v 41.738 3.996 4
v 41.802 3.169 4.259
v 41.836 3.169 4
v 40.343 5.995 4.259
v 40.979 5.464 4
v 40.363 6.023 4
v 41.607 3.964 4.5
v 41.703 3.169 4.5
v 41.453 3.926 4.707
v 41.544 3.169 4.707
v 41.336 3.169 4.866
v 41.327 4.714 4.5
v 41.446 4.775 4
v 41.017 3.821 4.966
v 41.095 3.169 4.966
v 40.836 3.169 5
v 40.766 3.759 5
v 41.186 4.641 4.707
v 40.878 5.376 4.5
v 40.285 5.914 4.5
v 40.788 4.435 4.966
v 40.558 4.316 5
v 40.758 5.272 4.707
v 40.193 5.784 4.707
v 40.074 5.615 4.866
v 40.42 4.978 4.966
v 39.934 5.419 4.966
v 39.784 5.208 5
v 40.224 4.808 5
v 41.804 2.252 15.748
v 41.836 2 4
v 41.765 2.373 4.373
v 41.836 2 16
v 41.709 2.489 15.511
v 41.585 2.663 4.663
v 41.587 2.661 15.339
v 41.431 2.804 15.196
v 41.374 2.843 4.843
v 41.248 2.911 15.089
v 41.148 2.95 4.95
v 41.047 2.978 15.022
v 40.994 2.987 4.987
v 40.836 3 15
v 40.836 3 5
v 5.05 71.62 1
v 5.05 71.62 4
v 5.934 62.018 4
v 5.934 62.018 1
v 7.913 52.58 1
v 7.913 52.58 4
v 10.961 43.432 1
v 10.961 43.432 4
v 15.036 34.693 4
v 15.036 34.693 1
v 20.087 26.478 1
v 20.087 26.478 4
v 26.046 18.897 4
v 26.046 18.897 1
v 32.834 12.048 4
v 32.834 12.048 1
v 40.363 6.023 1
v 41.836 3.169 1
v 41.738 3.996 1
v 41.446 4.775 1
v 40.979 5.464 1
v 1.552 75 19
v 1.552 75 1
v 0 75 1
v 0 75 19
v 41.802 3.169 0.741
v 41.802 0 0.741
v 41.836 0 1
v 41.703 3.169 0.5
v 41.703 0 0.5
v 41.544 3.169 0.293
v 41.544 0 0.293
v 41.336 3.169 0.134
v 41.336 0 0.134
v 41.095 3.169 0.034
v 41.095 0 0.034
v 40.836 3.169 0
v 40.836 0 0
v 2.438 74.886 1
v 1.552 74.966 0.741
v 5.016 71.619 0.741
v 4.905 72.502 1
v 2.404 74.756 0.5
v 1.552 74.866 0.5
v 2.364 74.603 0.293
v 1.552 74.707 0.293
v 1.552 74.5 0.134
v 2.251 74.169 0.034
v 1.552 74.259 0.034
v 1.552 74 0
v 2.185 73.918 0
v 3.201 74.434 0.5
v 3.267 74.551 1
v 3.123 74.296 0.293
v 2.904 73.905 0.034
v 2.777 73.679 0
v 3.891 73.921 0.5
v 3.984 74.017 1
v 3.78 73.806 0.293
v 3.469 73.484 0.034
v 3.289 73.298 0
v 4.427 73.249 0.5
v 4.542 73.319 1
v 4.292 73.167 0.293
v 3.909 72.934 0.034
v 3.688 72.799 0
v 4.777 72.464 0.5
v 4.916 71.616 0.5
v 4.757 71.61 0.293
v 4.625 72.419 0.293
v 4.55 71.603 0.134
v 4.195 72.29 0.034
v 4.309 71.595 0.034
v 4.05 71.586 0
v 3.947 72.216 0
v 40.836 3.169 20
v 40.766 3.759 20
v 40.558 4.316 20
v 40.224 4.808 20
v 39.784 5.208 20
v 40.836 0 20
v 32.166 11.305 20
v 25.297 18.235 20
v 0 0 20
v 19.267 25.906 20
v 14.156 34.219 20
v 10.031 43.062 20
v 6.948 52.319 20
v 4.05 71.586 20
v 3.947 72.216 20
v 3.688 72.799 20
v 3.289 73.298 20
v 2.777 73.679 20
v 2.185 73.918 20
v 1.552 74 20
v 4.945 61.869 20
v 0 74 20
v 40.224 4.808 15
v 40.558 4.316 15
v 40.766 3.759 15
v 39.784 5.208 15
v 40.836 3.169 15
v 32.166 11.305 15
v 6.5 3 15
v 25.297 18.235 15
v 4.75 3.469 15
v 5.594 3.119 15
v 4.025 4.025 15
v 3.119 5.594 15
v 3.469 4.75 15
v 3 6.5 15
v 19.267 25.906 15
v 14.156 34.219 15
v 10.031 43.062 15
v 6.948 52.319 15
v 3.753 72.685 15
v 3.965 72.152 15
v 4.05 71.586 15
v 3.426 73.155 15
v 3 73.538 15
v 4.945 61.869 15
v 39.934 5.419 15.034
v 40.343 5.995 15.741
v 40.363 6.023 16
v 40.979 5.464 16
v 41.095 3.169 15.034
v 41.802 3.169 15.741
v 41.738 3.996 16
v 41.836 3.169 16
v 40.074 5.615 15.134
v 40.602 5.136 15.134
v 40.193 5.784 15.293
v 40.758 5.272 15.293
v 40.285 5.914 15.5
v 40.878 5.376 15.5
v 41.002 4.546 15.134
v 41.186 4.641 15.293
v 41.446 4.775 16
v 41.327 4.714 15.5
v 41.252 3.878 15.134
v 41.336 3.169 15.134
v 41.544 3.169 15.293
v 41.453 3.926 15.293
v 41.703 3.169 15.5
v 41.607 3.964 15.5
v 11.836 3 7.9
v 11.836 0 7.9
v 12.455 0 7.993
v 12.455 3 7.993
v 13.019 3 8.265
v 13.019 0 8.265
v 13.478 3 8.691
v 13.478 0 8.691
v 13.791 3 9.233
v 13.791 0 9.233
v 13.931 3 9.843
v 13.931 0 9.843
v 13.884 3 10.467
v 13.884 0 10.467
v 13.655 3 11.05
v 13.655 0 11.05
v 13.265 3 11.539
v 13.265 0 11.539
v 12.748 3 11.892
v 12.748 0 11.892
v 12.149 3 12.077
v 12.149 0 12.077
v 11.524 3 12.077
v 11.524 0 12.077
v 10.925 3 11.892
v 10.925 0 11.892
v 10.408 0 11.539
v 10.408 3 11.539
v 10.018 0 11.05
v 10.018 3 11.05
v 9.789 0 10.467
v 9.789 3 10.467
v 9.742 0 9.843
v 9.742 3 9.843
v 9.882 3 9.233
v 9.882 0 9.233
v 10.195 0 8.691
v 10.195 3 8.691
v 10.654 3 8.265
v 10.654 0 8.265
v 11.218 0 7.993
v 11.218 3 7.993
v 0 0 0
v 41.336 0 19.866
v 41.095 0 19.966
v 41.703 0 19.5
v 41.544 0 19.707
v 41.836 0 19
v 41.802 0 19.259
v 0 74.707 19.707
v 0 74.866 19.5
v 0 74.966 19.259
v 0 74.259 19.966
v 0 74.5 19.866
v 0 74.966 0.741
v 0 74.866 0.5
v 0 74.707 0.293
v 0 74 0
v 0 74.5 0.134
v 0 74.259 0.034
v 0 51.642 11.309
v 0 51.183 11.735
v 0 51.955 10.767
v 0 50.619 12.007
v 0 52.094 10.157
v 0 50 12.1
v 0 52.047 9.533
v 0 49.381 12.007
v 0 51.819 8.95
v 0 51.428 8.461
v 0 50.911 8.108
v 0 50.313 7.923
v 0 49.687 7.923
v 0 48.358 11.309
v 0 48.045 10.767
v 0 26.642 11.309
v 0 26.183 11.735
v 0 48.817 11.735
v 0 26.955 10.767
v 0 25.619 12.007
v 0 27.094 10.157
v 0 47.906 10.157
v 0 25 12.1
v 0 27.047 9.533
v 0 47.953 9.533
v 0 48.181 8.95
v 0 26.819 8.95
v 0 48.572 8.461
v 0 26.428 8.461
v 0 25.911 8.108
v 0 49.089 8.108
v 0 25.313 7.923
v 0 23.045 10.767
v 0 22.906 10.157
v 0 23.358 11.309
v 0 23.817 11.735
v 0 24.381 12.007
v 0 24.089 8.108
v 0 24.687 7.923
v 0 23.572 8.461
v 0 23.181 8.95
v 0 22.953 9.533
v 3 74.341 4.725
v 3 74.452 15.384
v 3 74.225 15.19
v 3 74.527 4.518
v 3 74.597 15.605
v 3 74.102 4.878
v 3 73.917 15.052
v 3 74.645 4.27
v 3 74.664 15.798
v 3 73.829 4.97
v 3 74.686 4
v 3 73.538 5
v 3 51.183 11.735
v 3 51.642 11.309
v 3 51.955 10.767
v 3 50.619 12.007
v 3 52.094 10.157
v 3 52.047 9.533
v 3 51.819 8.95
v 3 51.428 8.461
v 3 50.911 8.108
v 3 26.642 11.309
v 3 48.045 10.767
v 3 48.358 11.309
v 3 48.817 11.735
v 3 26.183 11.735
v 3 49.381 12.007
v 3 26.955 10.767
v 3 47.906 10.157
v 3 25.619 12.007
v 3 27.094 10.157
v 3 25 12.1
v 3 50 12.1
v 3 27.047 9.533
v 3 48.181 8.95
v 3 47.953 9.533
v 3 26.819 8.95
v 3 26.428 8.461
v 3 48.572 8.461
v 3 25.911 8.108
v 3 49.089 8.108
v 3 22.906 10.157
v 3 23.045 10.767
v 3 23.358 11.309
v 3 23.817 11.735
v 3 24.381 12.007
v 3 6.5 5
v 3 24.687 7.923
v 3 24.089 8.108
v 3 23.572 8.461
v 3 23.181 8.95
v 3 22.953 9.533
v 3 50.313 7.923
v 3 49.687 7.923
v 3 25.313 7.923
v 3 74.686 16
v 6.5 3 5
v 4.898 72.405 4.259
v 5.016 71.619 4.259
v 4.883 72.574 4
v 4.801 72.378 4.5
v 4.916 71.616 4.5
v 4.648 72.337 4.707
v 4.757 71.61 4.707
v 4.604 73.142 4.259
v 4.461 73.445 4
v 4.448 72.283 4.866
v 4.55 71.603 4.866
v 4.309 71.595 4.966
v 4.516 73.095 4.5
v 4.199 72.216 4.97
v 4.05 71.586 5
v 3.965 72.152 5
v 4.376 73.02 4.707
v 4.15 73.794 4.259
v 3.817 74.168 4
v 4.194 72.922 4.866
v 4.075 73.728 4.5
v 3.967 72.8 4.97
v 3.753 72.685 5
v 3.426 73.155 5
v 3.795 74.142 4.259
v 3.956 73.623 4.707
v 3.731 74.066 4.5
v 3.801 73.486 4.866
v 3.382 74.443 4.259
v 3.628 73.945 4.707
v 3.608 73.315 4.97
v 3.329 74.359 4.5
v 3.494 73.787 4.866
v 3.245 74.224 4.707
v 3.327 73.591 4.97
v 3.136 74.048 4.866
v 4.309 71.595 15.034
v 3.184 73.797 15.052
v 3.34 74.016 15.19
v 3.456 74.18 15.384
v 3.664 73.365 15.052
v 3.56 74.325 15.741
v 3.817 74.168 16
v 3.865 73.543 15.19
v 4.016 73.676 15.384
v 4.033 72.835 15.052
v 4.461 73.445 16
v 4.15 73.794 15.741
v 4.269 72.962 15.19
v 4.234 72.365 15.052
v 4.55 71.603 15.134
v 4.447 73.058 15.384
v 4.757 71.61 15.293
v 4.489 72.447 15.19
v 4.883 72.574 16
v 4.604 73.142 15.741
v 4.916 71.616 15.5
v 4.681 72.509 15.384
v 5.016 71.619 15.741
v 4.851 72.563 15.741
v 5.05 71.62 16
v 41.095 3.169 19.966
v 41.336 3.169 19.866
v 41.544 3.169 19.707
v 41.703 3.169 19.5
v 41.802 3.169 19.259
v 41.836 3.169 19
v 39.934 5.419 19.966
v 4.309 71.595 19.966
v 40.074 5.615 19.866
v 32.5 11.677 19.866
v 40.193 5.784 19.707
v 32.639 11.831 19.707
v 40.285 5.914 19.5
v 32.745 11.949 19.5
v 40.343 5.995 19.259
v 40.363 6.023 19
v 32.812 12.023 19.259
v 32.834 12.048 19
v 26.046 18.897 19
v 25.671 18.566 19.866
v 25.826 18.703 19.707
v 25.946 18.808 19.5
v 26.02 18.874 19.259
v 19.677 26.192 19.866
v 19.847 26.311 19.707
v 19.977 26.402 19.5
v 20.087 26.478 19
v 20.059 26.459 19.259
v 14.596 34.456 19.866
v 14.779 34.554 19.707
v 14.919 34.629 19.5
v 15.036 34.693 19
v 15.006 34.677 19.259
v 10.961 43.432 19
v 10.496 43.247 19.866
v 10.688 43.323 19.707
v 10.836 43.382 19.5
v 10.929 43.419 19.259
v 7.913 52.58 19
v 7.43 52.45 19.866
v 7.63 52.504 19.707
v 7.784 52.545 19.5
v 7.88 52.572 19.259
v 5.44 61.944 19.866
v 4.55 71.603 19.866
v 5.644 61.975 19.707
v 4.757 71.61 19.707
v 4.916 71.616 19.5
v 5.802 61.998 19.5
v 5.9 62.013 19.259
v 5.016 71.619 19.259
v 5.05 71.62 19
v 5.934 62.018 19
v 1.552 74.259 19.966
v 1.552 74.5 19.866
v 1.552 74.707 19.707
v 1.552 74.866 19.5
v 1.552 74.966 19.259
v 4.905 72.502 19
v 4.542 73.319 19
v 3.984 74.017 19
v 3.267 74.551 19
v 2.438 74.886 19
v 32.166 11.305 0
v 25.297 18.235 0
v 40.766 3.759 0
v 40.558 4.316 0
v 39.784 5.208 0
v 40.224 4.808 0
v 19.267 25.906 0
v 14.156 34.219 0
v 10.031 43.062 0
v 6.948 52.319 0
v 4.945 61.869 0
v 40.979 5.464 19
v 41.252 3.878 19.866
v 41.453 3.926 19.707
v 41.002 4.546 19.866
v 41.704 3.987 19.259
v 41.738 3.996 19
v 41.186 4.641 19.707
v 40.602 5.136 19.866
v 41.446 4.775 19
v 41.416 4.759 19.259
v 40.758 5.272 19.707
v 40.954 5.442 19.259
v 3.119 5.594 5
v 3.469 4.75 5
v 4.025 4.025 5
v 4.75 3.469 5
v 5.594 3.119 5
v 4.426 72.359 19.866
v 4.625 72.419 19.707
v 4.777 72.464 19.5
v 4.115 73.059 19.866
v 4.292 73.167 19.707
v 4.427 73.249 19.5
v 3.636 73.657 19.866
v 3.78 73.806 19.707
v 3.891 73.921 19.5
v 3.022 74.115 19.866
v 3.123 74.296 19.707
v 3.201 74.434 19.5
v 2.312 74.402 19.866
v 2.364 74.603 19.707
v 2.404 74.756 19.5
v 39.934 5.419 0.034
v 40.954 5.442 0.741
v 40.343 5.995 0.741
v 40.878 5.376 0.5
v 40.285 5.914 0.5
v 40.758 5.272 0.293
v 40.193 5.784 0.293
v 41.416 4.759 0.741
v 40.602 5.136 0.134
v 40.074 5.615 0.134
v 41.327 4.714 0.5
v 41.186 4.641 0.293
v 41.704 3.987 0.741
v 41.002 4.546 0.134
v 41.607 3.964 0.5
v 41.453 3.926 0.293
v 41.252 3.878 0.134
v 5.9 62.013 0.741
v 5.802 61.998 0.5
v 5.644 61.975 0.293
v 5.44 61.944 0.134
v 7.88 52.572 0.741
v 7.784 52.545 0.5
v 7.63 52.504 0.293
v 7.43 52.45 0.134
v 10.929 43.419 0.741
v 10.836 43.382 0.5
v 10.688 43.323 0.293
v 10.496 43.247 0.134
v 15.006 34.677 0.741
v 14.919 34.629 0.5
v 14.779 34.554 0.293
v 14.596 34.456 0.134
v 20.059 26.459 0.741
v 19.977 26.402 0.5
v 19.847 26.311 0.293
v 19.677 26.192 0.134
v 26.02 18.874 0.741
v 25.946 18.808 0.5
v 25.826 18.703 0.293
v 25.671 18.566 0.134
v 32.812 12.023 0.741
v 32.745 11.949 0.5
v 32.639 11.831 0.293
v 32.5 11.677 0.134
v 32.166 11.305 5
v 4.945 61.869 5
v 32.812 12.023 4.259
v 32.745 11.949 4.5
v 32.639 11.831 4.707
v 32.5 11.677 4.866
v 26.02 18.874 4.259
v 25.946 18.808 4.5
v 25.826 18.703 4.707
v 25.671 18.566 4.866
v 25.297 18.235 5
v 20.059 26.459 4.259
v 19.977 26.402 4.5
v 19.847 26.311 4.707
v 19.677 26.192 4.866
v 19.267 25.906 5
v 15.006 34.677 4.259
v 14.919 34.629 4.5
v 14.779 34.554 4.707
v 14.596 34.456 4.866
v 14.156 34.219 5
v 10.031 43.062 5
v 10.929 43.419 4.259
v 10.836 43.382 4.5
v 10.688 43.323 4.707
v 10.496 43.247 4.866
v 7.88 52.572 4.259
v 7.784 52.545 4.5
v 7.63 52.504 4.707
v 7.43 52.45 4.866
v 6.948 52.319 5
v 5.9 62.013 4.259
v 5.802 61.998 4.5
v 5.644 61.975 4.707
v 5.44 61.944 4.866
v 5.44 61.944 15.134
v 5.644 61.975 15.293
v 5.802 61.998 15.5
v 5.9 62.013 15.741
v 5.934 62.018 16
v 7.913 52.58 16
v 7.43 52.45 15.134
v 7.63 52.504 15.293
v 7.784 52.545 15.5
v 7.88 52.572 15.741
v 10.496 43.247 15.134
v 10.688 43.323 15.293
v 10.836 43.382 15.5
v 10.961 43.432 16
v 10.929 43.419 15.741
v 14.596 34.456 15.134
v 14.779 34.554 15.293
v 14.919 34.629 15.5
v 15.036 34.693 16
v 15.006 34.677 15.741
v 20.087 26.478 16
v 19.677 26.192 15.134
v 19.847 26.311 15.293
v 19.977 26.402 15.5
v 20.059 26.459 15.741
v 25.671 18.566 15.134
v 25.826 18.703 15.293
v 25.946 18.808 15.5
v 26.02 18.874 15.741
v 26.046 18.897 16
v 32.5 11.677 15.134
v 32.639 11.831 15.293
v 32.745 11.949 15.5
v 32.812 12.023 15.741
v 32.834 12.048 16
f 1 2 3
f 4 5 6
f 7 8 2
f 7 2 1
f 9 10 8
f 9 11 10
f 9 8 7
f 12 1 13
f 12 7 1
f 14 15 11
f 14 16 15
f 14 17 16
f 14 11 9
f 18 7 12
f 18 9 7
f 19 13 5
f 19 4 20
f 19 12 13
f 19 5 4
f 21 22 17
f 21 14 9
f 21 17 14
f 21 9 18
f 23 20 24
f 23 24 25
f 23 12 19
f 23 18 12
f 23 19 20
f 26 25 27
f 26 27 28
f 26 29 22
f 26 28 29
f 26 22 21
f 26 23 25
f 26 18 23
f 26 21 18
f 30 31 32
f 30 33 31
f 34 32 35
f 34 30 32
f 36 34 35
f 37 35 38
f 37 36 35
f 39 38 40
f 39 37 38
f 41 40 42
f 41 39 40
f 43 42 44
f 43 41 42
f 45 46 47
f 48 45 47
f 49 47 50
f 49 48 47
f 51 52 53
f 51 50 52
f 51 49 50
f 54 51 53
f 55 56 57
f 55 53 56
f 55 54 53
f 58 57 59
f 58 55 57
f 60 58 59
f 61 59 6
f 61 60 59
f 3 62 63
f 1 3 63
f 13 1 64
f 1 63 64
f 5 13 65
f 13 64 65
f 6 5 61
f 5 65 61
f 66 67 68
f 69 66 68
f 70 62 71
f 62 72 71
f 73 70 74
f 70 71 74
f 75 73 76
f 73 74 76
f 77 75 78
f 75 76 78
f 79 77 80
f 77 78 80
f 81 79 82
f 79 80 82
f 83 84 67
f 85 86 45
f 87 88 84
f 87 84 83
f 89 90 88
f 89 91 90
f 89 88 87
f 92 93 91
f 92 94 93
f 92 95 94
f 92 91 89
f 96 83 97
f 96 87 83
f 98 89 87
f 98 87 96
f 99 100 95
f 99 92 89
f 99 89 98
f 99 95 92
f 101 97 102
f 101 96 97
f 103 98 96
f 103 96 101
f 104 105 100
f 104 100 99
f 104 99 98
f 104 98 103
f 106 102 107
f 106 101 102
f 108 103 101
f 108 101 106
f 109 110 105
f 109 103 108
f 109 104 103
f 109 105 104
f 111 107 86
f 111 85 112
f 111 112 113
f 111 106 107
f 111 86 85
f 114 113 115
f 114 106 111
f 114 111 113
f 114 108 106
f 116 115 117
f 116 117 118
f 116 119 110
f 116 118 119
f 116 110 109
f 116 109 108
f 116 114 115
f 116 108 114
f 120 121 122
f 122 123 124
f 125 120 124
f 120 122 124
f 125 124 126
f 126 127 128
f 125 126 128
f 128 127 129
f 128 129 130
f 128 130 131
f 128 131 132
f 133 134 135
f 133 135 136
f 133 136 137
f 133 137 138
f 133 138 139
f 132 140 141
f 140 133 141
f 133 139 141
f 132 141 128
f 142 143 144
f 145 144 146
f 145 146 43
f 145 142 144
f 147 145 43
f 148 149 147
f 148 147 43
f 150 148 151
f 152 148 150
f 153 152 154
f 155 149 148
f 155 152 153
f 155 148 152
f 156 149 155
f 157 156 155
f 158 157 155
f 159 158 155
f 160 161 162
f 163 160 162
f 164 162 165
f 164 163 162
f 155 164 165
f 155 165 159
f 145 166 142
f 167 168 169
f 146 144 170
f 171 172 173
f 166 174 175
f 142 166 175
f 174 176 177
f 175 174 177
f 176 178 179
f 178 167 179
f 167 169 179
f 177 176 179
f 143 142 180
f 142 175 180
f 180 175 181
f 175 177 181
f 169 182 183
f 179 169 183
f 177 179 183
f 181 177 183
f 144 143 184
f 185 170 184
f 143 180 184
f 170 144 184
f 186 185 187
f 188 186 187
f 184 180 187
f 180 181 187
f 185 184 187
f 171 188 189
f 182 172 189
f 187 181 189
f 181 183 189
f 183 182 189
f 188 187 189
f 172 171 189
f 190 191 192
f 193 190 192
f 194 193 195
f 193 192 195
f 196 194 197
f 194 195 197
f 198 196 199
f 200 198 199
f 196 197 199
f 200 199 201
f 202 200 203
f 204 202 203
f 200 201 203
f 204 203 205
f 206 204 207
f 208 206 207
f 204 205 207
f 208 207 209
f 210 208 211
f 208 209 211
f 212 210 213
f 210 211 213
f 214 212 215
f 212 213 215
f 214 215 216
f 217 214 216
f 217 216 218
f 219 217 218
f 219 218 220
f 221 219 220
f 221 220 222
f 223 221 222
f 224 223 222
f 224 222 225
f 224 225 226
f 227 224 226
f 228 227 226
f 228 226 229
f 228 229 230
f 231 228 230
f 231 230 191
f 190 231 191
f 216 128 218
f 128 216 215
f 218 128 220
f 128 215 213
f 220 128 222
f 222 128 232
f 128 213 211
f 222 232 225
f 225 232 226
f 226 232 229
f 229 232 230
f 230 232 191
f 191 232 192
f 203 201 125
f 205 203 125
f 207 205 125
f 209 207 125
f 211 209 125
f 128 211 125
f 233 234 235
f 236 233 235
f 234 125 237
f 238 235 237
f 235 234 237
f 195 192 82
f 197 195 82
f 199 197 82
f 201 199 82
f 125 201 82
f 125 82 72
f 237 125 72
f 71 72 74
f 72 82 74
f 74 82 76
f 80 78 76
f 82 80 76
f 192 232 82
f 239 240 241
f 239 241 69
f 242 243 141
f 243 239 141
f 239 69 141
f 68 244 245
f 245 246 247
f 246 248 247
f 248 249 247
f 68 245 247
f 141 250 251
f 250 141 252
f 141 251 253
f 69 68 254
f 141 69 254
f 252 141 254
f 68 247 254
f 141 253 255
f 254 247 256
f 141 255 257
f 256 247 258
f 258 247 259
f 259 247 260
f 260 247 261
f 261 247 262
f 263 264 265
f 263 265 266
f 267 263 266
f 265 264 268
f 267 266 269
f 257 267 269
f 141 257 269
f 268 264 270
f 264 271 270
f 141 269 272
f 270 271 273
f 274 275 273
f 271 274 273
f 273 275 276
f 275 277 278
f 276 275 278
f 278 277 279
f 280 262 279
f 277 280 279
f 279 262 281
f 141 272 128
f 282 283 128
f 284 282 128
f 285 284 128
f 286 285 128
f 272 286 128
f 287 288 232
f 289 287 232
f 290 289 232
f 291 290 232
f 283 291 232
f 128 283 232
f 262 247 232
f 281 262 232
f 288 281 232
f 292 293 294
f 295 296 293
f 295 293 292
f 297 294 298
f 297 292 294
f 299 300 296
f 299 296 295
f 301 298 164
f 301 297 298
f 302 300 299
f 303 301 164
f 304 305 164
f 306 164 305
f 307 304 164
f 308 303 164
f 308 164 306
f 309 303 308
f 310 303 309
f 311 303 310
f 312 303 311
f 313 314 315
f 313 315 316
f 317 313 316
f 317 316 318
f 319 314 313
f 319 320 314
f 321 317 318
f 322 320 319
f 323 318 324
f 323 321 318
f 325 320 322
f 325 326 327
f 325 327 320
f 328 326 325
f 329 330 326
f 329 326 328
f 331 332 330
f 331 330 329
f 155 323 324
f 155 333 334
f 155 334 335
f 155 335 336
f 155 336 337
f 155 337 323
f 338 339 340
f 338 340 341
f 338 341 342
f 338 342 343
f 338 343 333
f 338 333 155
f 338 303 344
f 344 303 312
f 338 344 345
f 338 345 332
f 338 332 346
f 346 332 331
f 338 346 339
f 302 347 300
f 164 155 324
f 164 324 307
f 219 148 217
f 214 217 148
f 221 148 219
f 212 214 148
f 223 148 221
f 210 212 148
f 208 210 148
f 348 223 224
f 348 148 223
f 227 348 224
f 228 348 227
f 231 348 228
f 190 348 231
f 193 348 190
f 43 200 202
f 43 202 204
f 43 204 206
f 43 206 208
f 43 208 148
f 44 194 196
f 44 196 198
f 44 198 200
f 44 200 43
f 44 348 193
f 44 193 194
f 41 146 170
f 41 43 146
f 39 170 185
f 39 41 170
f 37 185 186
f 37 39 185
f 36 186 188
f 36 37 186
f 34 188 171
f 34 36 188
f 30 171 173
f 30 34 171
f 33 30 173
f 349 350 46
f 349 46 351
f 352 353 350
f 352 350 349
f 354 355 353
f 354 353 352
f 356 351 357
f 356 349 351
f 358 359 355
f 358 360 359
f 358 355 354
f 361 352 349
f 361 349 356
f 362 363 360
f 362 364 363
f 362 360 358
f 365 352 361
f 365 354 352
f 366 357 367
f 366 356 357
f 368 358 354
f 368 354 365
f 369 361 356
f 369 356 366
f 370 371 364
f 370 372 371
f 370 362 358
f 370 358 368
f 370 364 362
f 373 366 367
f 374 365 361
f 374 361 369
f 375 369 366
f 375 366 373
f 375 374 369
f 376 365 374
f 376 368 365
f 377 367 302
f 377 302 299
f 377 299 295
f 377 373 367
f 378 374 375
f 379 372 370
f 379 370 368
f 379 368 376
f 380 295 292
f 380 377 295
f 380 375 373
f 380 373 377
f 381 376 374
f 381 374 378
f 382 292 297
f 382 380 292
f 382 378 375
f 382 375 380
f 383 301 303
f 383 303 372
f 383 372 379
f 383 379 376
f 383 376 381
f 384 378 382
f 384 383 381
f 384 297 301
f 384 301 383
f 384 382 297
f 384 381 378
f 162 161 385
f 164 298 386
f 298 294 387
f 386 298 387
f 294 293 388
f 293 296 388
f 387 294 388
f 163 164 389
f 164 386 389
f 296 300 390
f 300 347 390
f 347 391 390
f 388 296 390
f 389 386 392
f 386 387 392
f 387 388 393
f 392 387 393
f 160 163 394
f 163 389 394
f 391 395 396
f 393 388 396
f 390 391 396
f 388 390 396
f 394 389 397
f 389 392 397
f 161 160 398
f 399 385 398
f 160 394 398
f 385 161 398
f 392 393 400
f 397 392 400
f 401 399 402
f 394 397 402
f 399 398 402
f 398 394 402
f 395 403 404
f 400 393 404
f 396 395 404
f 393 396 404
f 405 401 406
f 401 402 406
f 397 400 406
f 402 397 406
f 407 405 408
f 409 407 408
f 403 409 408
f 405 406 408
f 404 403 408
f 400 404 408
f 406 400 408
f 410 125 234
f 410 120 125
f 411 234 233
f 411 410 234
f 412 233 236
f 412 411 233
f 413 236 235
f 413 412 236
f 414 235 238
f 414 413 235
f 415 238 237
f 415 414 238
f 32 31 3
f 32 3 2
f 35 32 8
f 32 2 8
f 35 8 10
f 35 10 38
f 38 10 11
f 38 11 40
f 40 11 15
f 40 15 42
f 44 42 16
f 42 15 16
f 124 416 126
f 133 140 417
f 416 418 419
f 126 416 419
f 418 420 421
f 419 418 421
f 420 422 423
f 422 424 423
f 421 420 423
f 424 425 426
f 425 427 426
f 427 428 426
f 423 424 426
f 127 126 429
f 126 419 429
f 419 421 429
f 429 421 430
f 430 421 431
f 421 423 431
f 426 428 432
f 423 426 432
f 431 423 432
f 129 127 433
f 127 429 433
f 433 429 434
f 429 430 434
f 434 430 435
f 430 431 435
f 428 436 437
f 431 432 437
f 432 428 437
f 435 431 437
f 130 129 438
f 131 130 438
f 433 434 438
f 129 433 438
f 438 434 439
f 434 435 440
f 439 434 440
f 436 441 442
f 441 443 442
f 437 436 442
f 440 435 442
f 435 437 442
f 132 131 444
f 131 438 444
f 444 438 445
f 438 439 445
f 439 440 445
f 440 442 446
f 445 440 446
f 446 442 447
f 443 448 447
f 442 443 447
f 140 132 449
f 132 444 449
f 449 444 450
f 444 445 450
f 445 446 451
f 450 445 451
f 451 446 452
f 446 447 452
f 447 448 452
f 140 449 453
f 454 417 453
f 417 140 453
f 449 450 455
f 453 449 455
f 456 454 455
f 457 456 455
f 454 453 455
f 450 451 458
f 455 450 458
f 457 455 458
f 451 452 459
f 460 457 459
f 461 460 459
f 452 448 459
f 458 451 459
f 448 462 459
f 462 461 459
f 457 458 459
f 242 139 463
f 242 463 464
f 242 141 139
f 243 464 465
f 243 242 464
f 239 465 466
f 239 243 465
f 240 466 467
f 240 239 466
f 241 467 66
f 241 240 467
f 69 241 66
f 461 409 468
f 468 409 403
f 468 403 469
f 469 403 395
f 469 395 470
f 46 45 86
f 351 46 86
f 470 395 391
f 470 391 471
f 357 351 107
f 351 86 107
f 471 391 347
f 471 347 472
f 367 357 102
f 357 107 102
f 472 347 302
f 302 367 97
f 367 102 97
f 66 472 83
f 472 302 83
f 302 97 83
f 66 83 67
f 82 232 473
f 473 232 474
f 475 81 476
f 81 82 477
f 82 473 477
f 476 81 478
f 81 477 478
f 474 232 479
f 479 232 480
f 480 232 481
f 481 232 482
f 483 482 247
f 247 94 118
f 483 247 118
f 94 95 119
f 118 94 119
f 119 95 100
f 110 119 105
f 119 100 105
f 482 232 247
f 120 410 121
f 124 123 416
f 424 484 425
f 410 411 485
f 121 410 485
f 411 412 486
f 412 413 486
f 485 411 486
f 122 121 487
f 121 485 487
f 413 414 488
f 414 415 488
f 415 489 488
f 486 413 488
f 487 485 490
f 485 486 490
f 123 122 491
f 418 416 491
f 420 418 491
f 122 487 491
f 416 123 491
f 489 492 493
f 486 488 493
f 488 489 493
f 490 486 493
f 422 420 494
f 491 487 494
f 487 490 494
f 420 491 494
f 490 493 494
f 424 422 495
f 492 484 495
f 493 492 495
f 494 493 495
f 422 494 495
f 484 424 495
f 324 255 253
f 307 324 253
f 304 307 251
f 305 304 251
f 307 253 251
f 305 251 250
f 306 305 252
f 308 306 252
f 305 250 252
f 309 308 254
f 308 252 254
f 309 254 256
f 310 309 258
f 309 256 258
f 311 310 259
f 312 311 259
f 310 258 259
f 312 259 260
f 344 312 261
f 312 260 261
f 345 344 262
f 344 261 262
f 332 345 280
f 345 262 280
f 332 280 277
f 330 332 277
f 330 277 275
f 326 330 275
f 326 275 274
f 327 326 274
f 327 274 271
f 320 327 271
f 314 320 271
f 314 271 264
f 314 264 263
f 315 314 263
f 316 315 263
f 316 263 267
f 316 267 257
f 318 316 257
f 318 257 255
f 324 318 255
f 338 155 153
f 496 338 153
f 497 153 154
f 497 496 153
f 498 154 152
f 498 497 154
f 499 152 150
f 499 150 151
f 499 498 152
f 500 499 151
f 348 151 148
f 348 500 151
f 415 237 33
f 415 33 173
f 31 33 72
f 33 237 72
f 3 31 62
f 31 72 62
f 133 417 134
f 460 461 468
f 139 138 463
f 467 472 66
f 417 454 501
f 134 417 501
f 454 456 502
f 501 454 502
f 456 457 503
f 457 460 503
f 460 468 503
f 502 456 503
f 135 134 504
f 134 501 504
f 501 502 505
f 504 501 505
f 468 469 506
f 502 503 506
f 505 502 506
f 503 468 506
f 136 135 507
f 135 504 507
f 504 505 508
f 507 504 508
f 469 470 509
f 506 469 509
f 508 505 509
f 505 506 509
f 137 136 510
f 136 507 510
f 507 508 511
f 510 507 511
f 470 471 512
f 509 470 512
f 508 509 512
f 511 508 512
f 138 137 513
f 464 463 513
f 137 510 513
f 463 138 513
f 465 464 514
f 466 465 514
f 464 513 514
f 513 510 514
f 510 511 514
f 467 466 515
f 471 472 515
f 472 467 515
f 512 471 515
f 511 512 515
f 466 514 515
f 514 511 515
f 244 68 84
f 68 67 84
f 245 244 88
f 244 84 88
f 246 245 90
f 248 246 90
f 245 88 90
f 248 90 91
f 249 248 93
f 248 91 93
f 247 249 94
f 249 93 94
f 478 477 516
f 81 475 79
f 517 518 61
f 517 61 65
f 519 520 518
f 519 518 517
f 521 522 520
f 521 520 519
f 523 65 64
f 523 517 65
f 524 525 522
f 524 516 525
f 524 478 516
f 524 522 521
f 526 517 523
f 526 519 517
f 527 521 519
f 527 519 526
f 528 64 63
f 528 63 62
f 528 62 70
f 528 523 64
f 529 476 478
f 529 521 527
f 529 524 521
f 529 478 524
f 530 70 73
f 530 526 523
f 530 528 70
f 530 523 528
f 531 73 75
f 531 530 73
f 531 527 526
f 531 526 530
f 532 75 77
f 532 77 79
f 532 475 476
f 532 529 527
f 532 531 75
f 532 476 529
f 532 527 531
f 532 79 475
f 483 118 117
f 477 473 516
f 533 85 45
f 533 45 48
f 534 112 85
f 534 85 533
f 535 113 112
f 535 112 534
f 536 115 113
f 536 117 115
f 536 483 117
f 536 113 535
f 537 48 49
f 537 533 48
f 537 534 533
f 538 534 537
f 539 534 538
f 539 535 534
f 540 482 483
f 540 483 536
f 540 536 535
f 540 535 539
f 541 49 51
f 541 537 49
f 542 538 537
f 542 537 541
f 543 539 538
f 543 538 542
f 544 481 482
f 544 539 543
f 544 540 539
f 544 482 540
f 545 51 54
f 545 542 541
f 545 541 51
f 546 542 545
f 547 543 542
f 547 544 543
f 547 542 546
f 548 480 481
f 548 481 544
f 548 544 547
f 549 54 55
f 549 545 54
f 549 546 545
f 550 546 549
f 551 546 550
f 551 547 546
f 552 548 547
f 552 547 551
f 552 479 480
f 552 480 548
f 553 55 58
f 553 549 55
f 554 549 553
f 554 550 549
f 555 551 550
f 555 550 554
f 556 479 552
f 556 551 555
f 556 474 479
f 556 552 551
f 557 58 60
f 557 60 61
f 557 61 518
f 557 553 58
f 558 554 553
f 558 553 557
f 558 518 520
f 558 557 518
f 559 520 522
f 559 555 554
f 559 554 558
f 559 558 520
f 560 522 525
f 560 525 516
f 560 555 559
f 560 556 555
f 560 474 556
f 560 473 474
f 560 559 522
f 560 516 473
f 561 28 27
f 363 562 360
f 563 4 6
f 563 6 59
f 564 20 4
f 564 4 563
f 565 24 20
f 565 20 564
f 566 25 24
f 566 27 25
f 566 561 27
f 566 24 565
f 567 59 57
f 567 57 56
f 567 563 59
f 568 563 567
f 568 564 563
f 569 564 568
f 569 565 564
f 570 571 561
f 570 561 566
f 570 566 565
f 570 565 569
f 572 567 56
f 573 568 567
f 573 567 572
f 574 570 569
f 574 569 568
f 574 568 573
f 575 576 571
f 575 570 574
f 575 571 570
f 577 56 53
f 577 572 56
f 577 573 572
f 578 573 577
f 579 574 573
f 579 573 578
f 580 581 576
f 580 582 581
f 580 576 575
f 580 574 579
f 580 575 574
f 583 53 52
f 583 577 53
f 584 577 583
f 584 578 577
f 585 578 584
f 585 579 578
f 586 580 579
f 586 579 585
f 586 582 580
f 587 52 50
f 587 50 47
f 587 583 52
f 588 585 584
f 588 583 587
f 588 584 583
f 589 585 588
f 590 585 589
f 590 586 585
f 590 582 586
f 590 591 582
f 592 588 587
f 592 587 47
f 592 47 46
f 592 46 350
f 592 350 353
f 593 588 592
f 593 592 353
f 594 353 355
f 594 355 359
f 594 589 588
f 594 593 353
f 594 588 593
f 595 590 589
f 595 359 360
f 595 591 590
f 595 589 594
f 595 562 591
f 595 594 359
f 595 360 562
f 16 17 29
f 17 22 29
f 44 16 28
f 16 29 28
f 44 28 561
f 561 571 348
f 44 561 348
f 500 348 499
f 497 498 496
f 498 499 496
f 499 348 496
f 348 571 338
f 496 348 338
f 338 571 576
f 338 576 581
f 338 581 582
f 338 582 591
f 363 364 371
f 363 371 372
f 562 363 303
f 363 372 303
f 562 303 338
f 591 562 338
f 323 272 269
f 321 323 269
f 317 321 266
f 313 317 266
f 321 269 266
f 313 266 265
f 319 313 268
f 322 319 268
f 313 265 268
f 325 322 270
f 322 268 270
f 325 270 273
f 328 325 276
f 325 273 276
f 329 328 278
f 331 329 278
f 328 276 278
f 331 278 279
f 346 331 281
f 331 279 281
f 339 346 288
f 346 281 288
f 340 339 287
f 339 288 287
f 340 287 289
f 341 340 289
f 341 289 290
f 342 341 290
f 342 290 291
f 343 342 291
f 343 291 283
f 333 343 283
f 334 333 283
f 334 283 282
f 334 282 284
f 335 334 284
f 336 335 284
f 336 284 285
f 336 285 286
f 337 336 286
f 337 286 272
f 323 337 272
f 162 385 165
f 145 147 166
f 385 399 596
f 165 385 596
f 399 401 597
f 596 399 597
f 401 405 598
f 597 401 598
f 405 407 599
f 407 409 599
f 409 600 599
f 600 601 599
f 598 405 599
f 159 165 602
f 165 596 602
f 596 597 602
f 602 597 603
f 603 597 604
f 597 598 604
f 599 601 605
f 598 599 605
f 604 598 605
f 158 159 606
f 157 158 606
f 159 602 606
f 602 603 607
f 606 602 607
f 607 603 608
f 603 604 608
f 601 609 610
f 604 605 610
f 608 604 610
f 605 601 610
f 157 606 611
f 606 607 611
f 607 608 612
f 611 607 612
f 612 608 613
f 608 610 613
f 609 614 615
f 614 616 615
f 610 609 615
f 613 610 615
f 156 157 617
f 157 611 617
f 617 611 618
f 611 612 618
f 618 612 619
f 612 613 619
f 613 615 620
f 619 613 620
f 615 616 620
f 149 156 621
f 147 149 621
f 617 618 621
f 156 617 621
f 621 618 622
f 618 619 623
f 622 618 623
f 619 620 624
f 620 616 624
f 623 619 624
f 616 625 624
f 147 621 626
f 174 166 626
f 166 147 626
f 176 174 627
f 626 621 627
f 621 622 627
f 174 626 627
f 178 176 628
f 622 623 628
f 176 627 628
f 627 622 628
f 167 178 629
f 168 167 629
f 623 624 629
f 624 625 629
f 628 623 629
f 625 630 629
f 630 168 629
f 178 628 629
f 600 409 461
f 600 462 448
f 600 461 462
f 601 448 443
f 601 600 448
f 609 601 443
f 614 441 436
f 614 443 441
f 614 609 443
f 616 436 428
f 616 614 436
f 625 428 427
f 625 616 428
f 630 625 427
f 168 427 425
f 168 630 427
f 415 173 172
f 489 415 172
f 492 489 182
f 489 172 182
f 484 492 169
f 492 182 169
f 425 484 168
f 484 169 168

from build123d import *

# Parameters (mm, degrees)
BOSS_EXTRUDE1_DEPTH = 20
CUT_EXTRUDE1_DEPTH  = 15
BOSS_EXTRUDE2_DEPTH = 5
CUT_EXTRUDE2_REACH  = 90.178
SKETCH2_R           = 2.1
CUT_EXTRUDE3_REACH  = 90.178
SKETCH3_R           = 2.1
FILLET2_R           = 84
FILLET3_R           = 3.5
FILLET4_R           = 1


with BuildPart() as part:
    # Sketch1 → Boss-Extrude1 (new body)
    with BuildSketch(Plane.XY):
        Polygon((41.8365, 5), (5, 5), (5, 75), (0, 75), (0, 0), (41.8365, 0), align=None)
    extrude(amount=BOSS_EXTRUDE1_DEPTH)

    # Sketch1<3> → Cut-Extrude1 (cut)
    with BuildSketch(Plane.XY):
        Polygon((41.8365, 5), (5, 5), (5, 75), (3, 75), (3, 3), (41.8365, 3), align=None)
    extrude(amount=CUT_EXTRUDE1_DEPTH, mode=Mode.SUBTRACT)

    # Sketch1<4> → Boss-Extrude2 (add)
    with BuildSketch(Plane.XY):
        Polygon((41.8365, 5), (5, 5), (5, 75), (3, 75), (3, 3), (41.8365, 3), align=None)
    extrude(amount=BOSS_EXTRUDE2_DEPTH)

    # Sketch2 → Cut-Extrude2 (cut, up to next)
    with BuildSketch(Plane.XZ, mode=Mode.PRIVATE) as cut_extrude2_sk1:
        with Locations(Location((11.8365, 10, 0), (0, 0, 270))):
            Circle(SKETCH2_R)
    cut_extrude2_tool1 = extrude(cut_extrude2_sk1.sketch, amount=-CUT_EXTRUDE2_REACH, mode=Mode.PRIVATE) & part.part
    add(cut_extrude2_tool1.solids().sort_by_distance((11.8365, 0, 10))[0], mode=Mode.SUBTRACT)

    # Sketch3 → Cut-Extrude3 (cut, up to next)
    with BuildSketch(Plane.ZY, mode=Mode.PRIVATE) as cut_extrude3_sk1:
        with Locations((10, 25)):
            Circle(SKETCH3_R)
    cut_extrude3_tool1 = extrude(cut_extrude3_sk1.sketch, amount=-CUT_EXTRUDE3_REACH, mode=Mode.PRIVATE) & part.part
    # Sketch3 → Cut-Extrude3 (cut, up to next)
    with BuildSketch(Plane.ZY, mode=Mode.PRIVATE) as cut_extrude3_sk2:
        with Locations((10, 50)):
            Circle(SKETCH3_R)
    cut_extrude3_tool2 = extrude(cut_extrude3_sk2.sketch, amount=-CUT_EXTRUDE3_REACH, mode=Mode.PRIVATE) & part.part
    add(cut_extrude3_tool1.solids().sort_by_distance((0, 25, 10))[0], mode=Mode.SUBTRACT)
    add(cut_extrude3_tool2.solids().sort_by_distance((0, 50, 10))[0], mode=Mode.SUBTRACT)

    # Fillet2
    # the kernel refuses this fillet: 84 mm, written as the material it adds along each edge
    with BuildSketch(Plane(origin=(5, 5, -158.774355627), x_dir=(1, 0, 0), z_dir=(0, 0, 1))) as fillet2_piece_1_section:
        with BuildLine():
            CenterArc((84, 69.509742251), FILLET2_R, 180, 55.842464398)
            Line((0, 69.509742251), (-1.68, 69.509742251))
            Line((-1.68, 69.509742251), (-1.68, 0))
            Line((-1.68, 0), (0, -1.68))
            ThreePointArc((0, -1.68), (18.41825, -1.68), (35.89323, -1.390194845))
            Line((35.89323, -1.390194845), (36.8365, 0))
        make_face()
    fillet2_piece_1 = extrude(amount=178.774355627, mode=Mode.PRIVATE)
    fillet2_piece_1 = split(fillet2_piece_1, bisect_by=Plane(origin=(14.491057498, 22.671022952, 0), z_dir=(0, 0, 1)), keep=Keep.TOP, mode=Mode.PRIVATE)
    fillet2_piece_1 = split(fillet2_piece_1, bisect_by=Plane(origin=(14.491057498, 22.671022952, 5), z_dir=(0, 0, -1)), keep=Keep.TOP, mode=Mode.PRIVATE)
    add(fillet2_piece_1)
    with BuildSketch(Plane(origin=(5, 5, 15), x_dir=(1, 0, 0), z_dir=(0, 0, 1)), Plane(origin=(5, 5, 0), x_dir=(1, 0, 0), z_dir=(0, 0, 1))) as fillet2_piece_2:
        with BuildLine():
            CenterArc((84, 69.509742251), FILLET2_R, 180, 55.842464398)
            Line((0, 69.509742251), (-1.68, 69.509742251))
            Line((-1.68, 69.509742251), (-1.68, 0))
            Line((-1.68, 0), (0, -1.68))
            ThreePointArc((0, -1.68), (18.41825, -1.68), (35.89323, -1.390194845))
            Line((35.89323, -1.390194845), (36.8365, 0))
        make_face()
    extrude(amount=5)
    with BuildSketch(Plane(origin=(5, 5, 0), x_dir=(1, 0, 0), z_dir=(0, 0, 1))) as fillet2_piece_3_section:
        with BuildLine():
            CenterArc((84, 69.509742251), FILLET2_R, 180, 55.842464398)
            Line((0, 69.509742251), (-1.68, 69.509742251))
            Line((-1.68, 69.509742251), (-1.68, 0))
            Line((-1.68, 0), (0, -1.68))
            ThreePointArc((0, -1.68), (18.41825, -1.68), (35.89323, -1.390194845))
            Line((35.89323, -1.390194845), (36.8365, 0))
        make_face()
    fillet2_piece_3 = extrude(amount=178.774355627, mode=Mode.PRIVATE)
    fillet2_piece_3 = split(fillet2_piece_3, bisect_by=Plane(origin=(14.491057498, 22.671022952, 15), z_dir=(0, 0, 1)), keep=Keep.TOP, mode=Mode.PRIVATE)
    fillet2_piece_3 = split(fillet2_piece_3, bisect_by=Plane(origin=(14.491057498, 22.671022952, 20), z_dir=(0, 0, -1)), keep=Keep.TOP, mode=Mode.PRIVATE)
    add(fillet2_piece_3)

    # Fillet3
    # the kernel refuses this fillet: 3.5 mm, written as the material it adds along each edge
    with BuildSketch(Plane(origin=(3, 3, 5), x_dir=(1, 0, 0), z_dir=(0, 0, 1))) as fillet3_piece_1:
        with BuildLine():
            CenterArc((FILLET3_R, FILLET3_R), FILLET3_R, 180, 90)
            Line((0, FILLET3_R), (-FILLET3_R * 0.02, FILLET3_R))
            Line((-FILLET3_R * 0.02, FILLET3_R), (-FILLET3_R * 0.02, -FILLET3_R * 0.02))
            Line((-FILLET3_R * 0.02, -FILLET3_R * 0.02), (FILLET3_R, -FILLET3_R * 0.02))
            Line((FILLET3_R, -FILLET3_R * 0.02), (FILLET3_R, 0))
        make_face()
    extrude(amount=10)
    # the kernel refuses this fillet: 3.5 mm, written as the material it takes off along each edge
    with BuildSketch(Plane(origin=(5, 75, -20.689329277), x_dir=(-1, 0, 0), z_dir=(0, 0, 1))) as fillet3_2_piece_1:
        with BuildLine():
            CenterArc((3.448221546, 3.5), FILLET3_R, 181.971194875, 88.028805125)
            Line((-0.049707316, 3.37961031), (-0.399500202, 3.367571341))
            ThreePointArc((-0.399500202, 3.367571341), (-0.35, 0.490257749), (-0.35, 0))
            Line((-0.35, 0), (0, -0.35))
            Line((0, -0.35), (3.448221546, -0.35))
            Line((3.448221546, -0.35), (3.448221546, 0))
        make_face()
    extrude(amount=46.378658554, mode=Mode.SUBTRACT)
    with BuildSketch(Plane(origin=(41.8365, 5, -10.984244879), x_dir=(0, -1, 0), z_dir=(0, 0, 1))) as fillet3_2_piece_2:
        with BuildLine():
            CenterArc((1.83070748, -3.5), FILLET3_R, 90, 54.618958209)
            Line((-1.022910509, -1.47346), (-1.079982869, -1.4329292))
            ThreePointArc((-1.079982869, -1.4329292), (-0.565023995, -0.699541323), (-0.057924785, 0.039302917))
            Line((-0.057924785, 0.039302917), (0, 0.07))
            Line((0, 0.07), (1.83070748, 0.07))
            Line((1.83070748, 0.07), (1.83070748, 0))
        make_face()
    extrude(amount=26.968489758, mode=Mode.SUBTRACT)
    with BuildSketch(Plane(origin=(41.8365, 5, 4.015755121), x_dir=(-0.8214550012543749, 0.5702733387720094, 0), z_dir=(0, 0, 1))) as fillet3_2_piece_3:
        with BuildLine():
            CenterArc((1.831088838, 3.499800501), FILLET3_R, 214.769288697, 54.618958209)
            Line((-1.044003667, 1.503843815), (-1.101505517, 1.463924681))
            Line((-1.101505517, 1.463924681), (-0.05750185, -0.039919134))
            Line((-0.05750185, -0.039919134), (0.000747383, -0.06999601))
            ThreePointArc((0.000747383, -0.06999601), (0.896859839, -0.065212021), (1.792972294, -0.06999601))
            Line((1.792972294, -0.06999601), (1.793719678, 0))
        make_face()
    extrude(amount=26.968489758, mode=Mode.SUBTRACT)

    # Fillet4
    fillet4_edges = [part.edges().sort_by_distance(p)[0] for p in [
        (0.775889227, 75, 20),
        (41.446394693, 4.775080489, 15),
        (4.461432686, 73.445228071, 15),
        (15.036480531, 34.69268827, 20),
        (41.446394693, 4.775080489, 20),
        (3.983715551, 74.017078059, 20),
        (0.775889227, 75, 0),
        (41.8365, 1.58464626, 20),
        (41.8365, 3.08464626, 15),
        (41.8365, 3, 10),
        (41.8365, 3.08464626, 5),
        (41.8365, 1.58464626, 0),
        (15.036480531, 34.69268827, 0),
        (41.446394693, 4.775080489, 0),
        (3.983715551, 74.017078059, 0),
        (15.036480531, 34.69268827, 5),
        (41.446394693, 4.775080489, 5),
        (4.461432686, 73.445228071, 5),
        (15.036480531, 34.69268827, 15),
    ]]
    fillet(fillet4_edges, radius=FILLET4_R)


solid = part.part
